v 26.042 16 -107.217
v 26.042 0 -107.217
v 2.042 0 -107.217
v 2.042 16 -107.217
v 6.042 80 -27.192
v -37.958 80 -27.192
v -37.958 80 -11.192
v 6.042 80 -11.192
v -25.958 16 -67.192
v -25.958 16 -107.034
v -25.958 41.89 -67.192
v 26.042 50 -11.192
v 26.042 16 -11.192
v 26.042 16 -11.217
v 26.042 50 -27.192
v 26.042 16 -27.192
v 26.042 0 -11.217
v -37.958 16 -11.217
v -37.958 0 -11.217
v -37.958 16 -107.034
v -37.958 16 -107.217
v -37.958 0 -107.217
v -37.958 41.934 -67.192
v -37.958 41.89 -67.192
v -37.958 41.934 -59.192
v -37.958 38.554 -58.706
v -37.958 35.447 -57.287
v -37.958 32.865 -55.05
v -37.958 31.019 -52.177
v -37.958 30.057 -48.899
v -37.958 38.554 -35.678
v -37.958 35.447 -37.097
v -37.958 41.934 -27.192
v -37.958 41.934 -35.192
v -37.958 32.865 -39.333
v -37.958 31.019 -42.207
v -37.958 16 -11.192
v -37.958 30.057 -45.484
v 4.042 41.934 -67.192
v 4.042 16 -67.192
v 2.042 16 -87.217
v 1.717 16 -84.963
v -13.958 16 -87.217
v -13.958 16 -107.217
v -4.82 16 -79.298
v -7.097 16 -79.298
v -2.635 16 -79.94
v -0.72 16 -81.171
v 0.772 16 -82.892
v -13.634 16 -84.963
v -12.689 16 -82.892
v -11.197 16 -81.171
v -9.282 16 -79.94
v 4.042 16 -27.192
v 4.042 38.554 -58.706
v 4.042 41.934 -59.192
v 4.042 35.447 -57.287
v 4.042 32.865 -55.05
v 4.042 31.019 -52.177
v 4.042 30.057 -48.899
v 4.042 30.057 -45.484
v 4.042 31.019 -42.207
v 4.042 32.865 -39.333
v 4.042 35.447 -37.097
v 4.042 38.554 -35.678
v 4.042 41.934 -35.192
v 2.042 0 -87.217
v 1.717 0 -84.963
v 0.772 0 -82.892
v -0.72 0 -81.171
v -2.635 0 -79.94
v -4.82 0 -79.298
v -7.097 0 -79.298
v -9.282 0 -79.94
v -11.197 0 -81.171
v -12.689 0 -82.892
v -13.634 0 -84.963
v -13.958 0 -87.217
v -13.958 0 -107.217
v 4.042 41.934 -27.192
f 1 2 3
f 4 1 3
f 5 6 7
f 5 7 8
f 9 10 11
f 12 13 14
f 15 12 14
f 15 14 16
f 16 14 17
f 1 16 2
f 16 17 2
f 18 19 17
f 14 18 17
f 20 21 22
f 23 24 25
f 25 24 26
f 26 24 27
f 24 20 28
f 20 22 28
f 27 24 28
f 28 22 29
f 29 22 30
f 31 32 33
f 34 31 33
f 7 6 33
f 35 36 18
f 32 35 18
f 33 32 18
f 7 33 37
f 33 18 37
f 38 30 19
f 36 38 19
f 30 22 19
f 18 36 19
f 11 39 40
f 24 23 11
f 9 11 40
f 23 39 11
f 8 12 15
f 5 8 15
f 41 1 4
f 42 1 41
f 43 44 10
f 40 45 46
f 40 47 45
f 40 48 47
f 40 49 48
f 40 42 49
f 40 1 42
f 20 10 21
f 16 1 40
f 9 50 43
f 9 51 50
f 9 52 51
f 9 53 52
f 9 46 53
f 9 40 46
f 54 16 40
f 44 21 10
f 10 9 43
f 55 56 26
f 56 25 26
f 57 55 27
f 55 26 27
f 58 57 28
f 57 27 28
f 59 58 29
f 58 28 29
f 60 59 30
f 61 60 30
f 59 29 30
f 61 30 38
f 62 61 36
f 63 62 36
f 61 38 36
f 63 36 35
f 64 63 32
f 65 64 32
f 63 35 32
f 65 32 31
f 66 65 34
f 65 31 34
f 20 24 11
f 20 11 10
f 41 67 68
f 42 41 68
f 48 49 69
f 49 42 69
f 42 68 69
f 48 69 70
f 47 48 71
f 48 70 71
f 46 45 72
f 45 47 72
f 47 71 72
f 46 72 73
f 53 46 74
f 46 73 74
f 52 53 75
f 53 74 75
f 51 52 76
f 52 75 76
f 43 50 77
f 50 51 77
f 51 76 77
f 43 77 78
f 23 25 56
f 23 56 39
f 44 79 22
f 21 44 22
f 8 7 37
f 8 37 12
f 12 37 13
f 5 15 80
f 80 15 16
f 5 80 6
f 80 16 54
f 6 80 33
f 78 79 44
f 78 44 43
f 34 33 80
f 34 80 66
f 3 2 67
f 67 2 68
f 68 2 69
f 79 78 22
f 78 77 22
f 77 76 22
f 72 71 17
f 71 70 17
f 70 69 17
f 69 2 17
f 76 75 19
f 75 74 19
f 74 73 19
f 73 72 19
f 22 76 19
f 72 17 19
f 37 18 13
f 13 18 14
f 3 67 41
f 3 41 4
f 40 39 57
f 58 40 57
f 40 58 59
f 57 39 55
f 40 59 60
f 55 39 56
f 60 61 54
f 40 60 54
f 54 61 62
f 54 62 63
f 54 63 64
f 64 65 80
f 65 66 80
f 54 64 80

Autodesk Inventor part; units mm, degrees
ref_plane "YZ Plane" through (0, 0, 0) normal (1, 0, 0) x (0, 1, 0)
ref_plane "XZ Plane" through (0, 0, 0) normal (0, 1, 0) x (-1, 0, 0)
ref_plane "XY Plane" through (0, 0, 0) normal (0, 0, 1) x (1, 0, 0)
sketch "Sketch1" plane through (0, 0, 0) normal (0, 1, 0) x (-1, 0, 0)
  line L0 (37.9585, -11.217) -> (-26.0415, -11.217)
  line L1 (-26.0415, -11.217) -> (-26.0415, -107.217)
  line L2 (-26.0415, -107.217) -> (37.9585, -107.217)
  line L3 (37.9585, -107.217) -> (37.9585, -11.217)
  line L4 (13.9585, -107.217) -> (13.9585, -87.217)
  arc A0 (13.9585, -87.217) -> (-2.0415, -87.217) centre (5.9585, -87.217) ccw
  line L5 (-2.0415, -87.217) -> (-2.0415, -107.217)
  point P0 (0, 0)
  dimension "d0" = 64
  dimension "d1" = 96
  dimension "d2" = 20
  dimension "d3" = 8
  dimension "d4" = 32
extrude "Extrusion1" add sketch "Sketch1" along normal blind 16 contours L3 L2 L4 A0 L5 L1 L0
sketch "Sketch2" plane through (0, 16, 0) normal (0, 1, 0) x (1, 0, 0)
  line L0 (-37.9585, 11.1917) -> (26.0415, 11.1917)
  line L1 (26.0415, 11.1917) -> (26.0415, 27.1917)
  line L2 (26.0415, 27.1917) -> (-37.9585, 27.1917)
  line L3 (-37.9585, 27.1917) -> (-37.9585, 11.1917)
  line L4 (26.0415, 11.217) -> (26.0415, 107.217) projected
  line L5 (-37.9585, 107.217) -> (-37.9585, 11.217) projected
  point P0 (0, 0)
  dimension "d7" = 16
extrude "Extrusion2" add sketch "Sketch2" along normal blind 64
chamfer "Chamfer1" distance 20 distance2 30 1 edges at (26.0415, 80, -19.1917) measured on face at (4.7081, 80, -16.525)
sketch "Sketch4" plane through (-37.9585, 0, -107.217) normal (-1, 0, 0) x (0, 0, 1)
  line L0 (80.0253, 15.9344) -> (80.0253, 41.9344)
  line L1 (80.0253, 41.9344) -> (72.0253, 41.9344)
  arc A0 (48.0253, 41.9344) -> (72.0253, 41.9344) centre (60.0253, 41.9344) ccw
  line L2 (48.0253, 41.9344) -> (40.0253, 41.9344)
  line L3 (40.0253, 41.9344) -> (40.0253, 15.9344)
  line L4 (40.0253, 15.9344) -> (80.0253, 15.9344)
  line L5 (80.0253, 16) -> (80.0253, 80) projected
  point P0 (107.217, 0)
  dimension "d19" = 26
  dimension "d20" = 8
  dimension "d21" = 8
  dimension "d22" = 12
extrude "Extrusion4" add sketch "Sketch4" against normal blind 42
sketch "Sketch5" plane through (-37.9585, 0, -107.217) normal (-1, 0, 0) x (0, 0, 1)
  line L0 (40.044, 41.902) -> (0.0026, 15.8826)
  line L1 (0.0026, 15.8826) -> (40.044, 15.8826)
  line L2 (40.044, 15.8826) -> (40.044, 41.902)
  point P0 (107.217, 0)
extrude "Extrusion5" add sketch "Sketch5" against normal blind 12
equation "\"d4\" = 0.5 * d0"
properties part number "Exercise01"
